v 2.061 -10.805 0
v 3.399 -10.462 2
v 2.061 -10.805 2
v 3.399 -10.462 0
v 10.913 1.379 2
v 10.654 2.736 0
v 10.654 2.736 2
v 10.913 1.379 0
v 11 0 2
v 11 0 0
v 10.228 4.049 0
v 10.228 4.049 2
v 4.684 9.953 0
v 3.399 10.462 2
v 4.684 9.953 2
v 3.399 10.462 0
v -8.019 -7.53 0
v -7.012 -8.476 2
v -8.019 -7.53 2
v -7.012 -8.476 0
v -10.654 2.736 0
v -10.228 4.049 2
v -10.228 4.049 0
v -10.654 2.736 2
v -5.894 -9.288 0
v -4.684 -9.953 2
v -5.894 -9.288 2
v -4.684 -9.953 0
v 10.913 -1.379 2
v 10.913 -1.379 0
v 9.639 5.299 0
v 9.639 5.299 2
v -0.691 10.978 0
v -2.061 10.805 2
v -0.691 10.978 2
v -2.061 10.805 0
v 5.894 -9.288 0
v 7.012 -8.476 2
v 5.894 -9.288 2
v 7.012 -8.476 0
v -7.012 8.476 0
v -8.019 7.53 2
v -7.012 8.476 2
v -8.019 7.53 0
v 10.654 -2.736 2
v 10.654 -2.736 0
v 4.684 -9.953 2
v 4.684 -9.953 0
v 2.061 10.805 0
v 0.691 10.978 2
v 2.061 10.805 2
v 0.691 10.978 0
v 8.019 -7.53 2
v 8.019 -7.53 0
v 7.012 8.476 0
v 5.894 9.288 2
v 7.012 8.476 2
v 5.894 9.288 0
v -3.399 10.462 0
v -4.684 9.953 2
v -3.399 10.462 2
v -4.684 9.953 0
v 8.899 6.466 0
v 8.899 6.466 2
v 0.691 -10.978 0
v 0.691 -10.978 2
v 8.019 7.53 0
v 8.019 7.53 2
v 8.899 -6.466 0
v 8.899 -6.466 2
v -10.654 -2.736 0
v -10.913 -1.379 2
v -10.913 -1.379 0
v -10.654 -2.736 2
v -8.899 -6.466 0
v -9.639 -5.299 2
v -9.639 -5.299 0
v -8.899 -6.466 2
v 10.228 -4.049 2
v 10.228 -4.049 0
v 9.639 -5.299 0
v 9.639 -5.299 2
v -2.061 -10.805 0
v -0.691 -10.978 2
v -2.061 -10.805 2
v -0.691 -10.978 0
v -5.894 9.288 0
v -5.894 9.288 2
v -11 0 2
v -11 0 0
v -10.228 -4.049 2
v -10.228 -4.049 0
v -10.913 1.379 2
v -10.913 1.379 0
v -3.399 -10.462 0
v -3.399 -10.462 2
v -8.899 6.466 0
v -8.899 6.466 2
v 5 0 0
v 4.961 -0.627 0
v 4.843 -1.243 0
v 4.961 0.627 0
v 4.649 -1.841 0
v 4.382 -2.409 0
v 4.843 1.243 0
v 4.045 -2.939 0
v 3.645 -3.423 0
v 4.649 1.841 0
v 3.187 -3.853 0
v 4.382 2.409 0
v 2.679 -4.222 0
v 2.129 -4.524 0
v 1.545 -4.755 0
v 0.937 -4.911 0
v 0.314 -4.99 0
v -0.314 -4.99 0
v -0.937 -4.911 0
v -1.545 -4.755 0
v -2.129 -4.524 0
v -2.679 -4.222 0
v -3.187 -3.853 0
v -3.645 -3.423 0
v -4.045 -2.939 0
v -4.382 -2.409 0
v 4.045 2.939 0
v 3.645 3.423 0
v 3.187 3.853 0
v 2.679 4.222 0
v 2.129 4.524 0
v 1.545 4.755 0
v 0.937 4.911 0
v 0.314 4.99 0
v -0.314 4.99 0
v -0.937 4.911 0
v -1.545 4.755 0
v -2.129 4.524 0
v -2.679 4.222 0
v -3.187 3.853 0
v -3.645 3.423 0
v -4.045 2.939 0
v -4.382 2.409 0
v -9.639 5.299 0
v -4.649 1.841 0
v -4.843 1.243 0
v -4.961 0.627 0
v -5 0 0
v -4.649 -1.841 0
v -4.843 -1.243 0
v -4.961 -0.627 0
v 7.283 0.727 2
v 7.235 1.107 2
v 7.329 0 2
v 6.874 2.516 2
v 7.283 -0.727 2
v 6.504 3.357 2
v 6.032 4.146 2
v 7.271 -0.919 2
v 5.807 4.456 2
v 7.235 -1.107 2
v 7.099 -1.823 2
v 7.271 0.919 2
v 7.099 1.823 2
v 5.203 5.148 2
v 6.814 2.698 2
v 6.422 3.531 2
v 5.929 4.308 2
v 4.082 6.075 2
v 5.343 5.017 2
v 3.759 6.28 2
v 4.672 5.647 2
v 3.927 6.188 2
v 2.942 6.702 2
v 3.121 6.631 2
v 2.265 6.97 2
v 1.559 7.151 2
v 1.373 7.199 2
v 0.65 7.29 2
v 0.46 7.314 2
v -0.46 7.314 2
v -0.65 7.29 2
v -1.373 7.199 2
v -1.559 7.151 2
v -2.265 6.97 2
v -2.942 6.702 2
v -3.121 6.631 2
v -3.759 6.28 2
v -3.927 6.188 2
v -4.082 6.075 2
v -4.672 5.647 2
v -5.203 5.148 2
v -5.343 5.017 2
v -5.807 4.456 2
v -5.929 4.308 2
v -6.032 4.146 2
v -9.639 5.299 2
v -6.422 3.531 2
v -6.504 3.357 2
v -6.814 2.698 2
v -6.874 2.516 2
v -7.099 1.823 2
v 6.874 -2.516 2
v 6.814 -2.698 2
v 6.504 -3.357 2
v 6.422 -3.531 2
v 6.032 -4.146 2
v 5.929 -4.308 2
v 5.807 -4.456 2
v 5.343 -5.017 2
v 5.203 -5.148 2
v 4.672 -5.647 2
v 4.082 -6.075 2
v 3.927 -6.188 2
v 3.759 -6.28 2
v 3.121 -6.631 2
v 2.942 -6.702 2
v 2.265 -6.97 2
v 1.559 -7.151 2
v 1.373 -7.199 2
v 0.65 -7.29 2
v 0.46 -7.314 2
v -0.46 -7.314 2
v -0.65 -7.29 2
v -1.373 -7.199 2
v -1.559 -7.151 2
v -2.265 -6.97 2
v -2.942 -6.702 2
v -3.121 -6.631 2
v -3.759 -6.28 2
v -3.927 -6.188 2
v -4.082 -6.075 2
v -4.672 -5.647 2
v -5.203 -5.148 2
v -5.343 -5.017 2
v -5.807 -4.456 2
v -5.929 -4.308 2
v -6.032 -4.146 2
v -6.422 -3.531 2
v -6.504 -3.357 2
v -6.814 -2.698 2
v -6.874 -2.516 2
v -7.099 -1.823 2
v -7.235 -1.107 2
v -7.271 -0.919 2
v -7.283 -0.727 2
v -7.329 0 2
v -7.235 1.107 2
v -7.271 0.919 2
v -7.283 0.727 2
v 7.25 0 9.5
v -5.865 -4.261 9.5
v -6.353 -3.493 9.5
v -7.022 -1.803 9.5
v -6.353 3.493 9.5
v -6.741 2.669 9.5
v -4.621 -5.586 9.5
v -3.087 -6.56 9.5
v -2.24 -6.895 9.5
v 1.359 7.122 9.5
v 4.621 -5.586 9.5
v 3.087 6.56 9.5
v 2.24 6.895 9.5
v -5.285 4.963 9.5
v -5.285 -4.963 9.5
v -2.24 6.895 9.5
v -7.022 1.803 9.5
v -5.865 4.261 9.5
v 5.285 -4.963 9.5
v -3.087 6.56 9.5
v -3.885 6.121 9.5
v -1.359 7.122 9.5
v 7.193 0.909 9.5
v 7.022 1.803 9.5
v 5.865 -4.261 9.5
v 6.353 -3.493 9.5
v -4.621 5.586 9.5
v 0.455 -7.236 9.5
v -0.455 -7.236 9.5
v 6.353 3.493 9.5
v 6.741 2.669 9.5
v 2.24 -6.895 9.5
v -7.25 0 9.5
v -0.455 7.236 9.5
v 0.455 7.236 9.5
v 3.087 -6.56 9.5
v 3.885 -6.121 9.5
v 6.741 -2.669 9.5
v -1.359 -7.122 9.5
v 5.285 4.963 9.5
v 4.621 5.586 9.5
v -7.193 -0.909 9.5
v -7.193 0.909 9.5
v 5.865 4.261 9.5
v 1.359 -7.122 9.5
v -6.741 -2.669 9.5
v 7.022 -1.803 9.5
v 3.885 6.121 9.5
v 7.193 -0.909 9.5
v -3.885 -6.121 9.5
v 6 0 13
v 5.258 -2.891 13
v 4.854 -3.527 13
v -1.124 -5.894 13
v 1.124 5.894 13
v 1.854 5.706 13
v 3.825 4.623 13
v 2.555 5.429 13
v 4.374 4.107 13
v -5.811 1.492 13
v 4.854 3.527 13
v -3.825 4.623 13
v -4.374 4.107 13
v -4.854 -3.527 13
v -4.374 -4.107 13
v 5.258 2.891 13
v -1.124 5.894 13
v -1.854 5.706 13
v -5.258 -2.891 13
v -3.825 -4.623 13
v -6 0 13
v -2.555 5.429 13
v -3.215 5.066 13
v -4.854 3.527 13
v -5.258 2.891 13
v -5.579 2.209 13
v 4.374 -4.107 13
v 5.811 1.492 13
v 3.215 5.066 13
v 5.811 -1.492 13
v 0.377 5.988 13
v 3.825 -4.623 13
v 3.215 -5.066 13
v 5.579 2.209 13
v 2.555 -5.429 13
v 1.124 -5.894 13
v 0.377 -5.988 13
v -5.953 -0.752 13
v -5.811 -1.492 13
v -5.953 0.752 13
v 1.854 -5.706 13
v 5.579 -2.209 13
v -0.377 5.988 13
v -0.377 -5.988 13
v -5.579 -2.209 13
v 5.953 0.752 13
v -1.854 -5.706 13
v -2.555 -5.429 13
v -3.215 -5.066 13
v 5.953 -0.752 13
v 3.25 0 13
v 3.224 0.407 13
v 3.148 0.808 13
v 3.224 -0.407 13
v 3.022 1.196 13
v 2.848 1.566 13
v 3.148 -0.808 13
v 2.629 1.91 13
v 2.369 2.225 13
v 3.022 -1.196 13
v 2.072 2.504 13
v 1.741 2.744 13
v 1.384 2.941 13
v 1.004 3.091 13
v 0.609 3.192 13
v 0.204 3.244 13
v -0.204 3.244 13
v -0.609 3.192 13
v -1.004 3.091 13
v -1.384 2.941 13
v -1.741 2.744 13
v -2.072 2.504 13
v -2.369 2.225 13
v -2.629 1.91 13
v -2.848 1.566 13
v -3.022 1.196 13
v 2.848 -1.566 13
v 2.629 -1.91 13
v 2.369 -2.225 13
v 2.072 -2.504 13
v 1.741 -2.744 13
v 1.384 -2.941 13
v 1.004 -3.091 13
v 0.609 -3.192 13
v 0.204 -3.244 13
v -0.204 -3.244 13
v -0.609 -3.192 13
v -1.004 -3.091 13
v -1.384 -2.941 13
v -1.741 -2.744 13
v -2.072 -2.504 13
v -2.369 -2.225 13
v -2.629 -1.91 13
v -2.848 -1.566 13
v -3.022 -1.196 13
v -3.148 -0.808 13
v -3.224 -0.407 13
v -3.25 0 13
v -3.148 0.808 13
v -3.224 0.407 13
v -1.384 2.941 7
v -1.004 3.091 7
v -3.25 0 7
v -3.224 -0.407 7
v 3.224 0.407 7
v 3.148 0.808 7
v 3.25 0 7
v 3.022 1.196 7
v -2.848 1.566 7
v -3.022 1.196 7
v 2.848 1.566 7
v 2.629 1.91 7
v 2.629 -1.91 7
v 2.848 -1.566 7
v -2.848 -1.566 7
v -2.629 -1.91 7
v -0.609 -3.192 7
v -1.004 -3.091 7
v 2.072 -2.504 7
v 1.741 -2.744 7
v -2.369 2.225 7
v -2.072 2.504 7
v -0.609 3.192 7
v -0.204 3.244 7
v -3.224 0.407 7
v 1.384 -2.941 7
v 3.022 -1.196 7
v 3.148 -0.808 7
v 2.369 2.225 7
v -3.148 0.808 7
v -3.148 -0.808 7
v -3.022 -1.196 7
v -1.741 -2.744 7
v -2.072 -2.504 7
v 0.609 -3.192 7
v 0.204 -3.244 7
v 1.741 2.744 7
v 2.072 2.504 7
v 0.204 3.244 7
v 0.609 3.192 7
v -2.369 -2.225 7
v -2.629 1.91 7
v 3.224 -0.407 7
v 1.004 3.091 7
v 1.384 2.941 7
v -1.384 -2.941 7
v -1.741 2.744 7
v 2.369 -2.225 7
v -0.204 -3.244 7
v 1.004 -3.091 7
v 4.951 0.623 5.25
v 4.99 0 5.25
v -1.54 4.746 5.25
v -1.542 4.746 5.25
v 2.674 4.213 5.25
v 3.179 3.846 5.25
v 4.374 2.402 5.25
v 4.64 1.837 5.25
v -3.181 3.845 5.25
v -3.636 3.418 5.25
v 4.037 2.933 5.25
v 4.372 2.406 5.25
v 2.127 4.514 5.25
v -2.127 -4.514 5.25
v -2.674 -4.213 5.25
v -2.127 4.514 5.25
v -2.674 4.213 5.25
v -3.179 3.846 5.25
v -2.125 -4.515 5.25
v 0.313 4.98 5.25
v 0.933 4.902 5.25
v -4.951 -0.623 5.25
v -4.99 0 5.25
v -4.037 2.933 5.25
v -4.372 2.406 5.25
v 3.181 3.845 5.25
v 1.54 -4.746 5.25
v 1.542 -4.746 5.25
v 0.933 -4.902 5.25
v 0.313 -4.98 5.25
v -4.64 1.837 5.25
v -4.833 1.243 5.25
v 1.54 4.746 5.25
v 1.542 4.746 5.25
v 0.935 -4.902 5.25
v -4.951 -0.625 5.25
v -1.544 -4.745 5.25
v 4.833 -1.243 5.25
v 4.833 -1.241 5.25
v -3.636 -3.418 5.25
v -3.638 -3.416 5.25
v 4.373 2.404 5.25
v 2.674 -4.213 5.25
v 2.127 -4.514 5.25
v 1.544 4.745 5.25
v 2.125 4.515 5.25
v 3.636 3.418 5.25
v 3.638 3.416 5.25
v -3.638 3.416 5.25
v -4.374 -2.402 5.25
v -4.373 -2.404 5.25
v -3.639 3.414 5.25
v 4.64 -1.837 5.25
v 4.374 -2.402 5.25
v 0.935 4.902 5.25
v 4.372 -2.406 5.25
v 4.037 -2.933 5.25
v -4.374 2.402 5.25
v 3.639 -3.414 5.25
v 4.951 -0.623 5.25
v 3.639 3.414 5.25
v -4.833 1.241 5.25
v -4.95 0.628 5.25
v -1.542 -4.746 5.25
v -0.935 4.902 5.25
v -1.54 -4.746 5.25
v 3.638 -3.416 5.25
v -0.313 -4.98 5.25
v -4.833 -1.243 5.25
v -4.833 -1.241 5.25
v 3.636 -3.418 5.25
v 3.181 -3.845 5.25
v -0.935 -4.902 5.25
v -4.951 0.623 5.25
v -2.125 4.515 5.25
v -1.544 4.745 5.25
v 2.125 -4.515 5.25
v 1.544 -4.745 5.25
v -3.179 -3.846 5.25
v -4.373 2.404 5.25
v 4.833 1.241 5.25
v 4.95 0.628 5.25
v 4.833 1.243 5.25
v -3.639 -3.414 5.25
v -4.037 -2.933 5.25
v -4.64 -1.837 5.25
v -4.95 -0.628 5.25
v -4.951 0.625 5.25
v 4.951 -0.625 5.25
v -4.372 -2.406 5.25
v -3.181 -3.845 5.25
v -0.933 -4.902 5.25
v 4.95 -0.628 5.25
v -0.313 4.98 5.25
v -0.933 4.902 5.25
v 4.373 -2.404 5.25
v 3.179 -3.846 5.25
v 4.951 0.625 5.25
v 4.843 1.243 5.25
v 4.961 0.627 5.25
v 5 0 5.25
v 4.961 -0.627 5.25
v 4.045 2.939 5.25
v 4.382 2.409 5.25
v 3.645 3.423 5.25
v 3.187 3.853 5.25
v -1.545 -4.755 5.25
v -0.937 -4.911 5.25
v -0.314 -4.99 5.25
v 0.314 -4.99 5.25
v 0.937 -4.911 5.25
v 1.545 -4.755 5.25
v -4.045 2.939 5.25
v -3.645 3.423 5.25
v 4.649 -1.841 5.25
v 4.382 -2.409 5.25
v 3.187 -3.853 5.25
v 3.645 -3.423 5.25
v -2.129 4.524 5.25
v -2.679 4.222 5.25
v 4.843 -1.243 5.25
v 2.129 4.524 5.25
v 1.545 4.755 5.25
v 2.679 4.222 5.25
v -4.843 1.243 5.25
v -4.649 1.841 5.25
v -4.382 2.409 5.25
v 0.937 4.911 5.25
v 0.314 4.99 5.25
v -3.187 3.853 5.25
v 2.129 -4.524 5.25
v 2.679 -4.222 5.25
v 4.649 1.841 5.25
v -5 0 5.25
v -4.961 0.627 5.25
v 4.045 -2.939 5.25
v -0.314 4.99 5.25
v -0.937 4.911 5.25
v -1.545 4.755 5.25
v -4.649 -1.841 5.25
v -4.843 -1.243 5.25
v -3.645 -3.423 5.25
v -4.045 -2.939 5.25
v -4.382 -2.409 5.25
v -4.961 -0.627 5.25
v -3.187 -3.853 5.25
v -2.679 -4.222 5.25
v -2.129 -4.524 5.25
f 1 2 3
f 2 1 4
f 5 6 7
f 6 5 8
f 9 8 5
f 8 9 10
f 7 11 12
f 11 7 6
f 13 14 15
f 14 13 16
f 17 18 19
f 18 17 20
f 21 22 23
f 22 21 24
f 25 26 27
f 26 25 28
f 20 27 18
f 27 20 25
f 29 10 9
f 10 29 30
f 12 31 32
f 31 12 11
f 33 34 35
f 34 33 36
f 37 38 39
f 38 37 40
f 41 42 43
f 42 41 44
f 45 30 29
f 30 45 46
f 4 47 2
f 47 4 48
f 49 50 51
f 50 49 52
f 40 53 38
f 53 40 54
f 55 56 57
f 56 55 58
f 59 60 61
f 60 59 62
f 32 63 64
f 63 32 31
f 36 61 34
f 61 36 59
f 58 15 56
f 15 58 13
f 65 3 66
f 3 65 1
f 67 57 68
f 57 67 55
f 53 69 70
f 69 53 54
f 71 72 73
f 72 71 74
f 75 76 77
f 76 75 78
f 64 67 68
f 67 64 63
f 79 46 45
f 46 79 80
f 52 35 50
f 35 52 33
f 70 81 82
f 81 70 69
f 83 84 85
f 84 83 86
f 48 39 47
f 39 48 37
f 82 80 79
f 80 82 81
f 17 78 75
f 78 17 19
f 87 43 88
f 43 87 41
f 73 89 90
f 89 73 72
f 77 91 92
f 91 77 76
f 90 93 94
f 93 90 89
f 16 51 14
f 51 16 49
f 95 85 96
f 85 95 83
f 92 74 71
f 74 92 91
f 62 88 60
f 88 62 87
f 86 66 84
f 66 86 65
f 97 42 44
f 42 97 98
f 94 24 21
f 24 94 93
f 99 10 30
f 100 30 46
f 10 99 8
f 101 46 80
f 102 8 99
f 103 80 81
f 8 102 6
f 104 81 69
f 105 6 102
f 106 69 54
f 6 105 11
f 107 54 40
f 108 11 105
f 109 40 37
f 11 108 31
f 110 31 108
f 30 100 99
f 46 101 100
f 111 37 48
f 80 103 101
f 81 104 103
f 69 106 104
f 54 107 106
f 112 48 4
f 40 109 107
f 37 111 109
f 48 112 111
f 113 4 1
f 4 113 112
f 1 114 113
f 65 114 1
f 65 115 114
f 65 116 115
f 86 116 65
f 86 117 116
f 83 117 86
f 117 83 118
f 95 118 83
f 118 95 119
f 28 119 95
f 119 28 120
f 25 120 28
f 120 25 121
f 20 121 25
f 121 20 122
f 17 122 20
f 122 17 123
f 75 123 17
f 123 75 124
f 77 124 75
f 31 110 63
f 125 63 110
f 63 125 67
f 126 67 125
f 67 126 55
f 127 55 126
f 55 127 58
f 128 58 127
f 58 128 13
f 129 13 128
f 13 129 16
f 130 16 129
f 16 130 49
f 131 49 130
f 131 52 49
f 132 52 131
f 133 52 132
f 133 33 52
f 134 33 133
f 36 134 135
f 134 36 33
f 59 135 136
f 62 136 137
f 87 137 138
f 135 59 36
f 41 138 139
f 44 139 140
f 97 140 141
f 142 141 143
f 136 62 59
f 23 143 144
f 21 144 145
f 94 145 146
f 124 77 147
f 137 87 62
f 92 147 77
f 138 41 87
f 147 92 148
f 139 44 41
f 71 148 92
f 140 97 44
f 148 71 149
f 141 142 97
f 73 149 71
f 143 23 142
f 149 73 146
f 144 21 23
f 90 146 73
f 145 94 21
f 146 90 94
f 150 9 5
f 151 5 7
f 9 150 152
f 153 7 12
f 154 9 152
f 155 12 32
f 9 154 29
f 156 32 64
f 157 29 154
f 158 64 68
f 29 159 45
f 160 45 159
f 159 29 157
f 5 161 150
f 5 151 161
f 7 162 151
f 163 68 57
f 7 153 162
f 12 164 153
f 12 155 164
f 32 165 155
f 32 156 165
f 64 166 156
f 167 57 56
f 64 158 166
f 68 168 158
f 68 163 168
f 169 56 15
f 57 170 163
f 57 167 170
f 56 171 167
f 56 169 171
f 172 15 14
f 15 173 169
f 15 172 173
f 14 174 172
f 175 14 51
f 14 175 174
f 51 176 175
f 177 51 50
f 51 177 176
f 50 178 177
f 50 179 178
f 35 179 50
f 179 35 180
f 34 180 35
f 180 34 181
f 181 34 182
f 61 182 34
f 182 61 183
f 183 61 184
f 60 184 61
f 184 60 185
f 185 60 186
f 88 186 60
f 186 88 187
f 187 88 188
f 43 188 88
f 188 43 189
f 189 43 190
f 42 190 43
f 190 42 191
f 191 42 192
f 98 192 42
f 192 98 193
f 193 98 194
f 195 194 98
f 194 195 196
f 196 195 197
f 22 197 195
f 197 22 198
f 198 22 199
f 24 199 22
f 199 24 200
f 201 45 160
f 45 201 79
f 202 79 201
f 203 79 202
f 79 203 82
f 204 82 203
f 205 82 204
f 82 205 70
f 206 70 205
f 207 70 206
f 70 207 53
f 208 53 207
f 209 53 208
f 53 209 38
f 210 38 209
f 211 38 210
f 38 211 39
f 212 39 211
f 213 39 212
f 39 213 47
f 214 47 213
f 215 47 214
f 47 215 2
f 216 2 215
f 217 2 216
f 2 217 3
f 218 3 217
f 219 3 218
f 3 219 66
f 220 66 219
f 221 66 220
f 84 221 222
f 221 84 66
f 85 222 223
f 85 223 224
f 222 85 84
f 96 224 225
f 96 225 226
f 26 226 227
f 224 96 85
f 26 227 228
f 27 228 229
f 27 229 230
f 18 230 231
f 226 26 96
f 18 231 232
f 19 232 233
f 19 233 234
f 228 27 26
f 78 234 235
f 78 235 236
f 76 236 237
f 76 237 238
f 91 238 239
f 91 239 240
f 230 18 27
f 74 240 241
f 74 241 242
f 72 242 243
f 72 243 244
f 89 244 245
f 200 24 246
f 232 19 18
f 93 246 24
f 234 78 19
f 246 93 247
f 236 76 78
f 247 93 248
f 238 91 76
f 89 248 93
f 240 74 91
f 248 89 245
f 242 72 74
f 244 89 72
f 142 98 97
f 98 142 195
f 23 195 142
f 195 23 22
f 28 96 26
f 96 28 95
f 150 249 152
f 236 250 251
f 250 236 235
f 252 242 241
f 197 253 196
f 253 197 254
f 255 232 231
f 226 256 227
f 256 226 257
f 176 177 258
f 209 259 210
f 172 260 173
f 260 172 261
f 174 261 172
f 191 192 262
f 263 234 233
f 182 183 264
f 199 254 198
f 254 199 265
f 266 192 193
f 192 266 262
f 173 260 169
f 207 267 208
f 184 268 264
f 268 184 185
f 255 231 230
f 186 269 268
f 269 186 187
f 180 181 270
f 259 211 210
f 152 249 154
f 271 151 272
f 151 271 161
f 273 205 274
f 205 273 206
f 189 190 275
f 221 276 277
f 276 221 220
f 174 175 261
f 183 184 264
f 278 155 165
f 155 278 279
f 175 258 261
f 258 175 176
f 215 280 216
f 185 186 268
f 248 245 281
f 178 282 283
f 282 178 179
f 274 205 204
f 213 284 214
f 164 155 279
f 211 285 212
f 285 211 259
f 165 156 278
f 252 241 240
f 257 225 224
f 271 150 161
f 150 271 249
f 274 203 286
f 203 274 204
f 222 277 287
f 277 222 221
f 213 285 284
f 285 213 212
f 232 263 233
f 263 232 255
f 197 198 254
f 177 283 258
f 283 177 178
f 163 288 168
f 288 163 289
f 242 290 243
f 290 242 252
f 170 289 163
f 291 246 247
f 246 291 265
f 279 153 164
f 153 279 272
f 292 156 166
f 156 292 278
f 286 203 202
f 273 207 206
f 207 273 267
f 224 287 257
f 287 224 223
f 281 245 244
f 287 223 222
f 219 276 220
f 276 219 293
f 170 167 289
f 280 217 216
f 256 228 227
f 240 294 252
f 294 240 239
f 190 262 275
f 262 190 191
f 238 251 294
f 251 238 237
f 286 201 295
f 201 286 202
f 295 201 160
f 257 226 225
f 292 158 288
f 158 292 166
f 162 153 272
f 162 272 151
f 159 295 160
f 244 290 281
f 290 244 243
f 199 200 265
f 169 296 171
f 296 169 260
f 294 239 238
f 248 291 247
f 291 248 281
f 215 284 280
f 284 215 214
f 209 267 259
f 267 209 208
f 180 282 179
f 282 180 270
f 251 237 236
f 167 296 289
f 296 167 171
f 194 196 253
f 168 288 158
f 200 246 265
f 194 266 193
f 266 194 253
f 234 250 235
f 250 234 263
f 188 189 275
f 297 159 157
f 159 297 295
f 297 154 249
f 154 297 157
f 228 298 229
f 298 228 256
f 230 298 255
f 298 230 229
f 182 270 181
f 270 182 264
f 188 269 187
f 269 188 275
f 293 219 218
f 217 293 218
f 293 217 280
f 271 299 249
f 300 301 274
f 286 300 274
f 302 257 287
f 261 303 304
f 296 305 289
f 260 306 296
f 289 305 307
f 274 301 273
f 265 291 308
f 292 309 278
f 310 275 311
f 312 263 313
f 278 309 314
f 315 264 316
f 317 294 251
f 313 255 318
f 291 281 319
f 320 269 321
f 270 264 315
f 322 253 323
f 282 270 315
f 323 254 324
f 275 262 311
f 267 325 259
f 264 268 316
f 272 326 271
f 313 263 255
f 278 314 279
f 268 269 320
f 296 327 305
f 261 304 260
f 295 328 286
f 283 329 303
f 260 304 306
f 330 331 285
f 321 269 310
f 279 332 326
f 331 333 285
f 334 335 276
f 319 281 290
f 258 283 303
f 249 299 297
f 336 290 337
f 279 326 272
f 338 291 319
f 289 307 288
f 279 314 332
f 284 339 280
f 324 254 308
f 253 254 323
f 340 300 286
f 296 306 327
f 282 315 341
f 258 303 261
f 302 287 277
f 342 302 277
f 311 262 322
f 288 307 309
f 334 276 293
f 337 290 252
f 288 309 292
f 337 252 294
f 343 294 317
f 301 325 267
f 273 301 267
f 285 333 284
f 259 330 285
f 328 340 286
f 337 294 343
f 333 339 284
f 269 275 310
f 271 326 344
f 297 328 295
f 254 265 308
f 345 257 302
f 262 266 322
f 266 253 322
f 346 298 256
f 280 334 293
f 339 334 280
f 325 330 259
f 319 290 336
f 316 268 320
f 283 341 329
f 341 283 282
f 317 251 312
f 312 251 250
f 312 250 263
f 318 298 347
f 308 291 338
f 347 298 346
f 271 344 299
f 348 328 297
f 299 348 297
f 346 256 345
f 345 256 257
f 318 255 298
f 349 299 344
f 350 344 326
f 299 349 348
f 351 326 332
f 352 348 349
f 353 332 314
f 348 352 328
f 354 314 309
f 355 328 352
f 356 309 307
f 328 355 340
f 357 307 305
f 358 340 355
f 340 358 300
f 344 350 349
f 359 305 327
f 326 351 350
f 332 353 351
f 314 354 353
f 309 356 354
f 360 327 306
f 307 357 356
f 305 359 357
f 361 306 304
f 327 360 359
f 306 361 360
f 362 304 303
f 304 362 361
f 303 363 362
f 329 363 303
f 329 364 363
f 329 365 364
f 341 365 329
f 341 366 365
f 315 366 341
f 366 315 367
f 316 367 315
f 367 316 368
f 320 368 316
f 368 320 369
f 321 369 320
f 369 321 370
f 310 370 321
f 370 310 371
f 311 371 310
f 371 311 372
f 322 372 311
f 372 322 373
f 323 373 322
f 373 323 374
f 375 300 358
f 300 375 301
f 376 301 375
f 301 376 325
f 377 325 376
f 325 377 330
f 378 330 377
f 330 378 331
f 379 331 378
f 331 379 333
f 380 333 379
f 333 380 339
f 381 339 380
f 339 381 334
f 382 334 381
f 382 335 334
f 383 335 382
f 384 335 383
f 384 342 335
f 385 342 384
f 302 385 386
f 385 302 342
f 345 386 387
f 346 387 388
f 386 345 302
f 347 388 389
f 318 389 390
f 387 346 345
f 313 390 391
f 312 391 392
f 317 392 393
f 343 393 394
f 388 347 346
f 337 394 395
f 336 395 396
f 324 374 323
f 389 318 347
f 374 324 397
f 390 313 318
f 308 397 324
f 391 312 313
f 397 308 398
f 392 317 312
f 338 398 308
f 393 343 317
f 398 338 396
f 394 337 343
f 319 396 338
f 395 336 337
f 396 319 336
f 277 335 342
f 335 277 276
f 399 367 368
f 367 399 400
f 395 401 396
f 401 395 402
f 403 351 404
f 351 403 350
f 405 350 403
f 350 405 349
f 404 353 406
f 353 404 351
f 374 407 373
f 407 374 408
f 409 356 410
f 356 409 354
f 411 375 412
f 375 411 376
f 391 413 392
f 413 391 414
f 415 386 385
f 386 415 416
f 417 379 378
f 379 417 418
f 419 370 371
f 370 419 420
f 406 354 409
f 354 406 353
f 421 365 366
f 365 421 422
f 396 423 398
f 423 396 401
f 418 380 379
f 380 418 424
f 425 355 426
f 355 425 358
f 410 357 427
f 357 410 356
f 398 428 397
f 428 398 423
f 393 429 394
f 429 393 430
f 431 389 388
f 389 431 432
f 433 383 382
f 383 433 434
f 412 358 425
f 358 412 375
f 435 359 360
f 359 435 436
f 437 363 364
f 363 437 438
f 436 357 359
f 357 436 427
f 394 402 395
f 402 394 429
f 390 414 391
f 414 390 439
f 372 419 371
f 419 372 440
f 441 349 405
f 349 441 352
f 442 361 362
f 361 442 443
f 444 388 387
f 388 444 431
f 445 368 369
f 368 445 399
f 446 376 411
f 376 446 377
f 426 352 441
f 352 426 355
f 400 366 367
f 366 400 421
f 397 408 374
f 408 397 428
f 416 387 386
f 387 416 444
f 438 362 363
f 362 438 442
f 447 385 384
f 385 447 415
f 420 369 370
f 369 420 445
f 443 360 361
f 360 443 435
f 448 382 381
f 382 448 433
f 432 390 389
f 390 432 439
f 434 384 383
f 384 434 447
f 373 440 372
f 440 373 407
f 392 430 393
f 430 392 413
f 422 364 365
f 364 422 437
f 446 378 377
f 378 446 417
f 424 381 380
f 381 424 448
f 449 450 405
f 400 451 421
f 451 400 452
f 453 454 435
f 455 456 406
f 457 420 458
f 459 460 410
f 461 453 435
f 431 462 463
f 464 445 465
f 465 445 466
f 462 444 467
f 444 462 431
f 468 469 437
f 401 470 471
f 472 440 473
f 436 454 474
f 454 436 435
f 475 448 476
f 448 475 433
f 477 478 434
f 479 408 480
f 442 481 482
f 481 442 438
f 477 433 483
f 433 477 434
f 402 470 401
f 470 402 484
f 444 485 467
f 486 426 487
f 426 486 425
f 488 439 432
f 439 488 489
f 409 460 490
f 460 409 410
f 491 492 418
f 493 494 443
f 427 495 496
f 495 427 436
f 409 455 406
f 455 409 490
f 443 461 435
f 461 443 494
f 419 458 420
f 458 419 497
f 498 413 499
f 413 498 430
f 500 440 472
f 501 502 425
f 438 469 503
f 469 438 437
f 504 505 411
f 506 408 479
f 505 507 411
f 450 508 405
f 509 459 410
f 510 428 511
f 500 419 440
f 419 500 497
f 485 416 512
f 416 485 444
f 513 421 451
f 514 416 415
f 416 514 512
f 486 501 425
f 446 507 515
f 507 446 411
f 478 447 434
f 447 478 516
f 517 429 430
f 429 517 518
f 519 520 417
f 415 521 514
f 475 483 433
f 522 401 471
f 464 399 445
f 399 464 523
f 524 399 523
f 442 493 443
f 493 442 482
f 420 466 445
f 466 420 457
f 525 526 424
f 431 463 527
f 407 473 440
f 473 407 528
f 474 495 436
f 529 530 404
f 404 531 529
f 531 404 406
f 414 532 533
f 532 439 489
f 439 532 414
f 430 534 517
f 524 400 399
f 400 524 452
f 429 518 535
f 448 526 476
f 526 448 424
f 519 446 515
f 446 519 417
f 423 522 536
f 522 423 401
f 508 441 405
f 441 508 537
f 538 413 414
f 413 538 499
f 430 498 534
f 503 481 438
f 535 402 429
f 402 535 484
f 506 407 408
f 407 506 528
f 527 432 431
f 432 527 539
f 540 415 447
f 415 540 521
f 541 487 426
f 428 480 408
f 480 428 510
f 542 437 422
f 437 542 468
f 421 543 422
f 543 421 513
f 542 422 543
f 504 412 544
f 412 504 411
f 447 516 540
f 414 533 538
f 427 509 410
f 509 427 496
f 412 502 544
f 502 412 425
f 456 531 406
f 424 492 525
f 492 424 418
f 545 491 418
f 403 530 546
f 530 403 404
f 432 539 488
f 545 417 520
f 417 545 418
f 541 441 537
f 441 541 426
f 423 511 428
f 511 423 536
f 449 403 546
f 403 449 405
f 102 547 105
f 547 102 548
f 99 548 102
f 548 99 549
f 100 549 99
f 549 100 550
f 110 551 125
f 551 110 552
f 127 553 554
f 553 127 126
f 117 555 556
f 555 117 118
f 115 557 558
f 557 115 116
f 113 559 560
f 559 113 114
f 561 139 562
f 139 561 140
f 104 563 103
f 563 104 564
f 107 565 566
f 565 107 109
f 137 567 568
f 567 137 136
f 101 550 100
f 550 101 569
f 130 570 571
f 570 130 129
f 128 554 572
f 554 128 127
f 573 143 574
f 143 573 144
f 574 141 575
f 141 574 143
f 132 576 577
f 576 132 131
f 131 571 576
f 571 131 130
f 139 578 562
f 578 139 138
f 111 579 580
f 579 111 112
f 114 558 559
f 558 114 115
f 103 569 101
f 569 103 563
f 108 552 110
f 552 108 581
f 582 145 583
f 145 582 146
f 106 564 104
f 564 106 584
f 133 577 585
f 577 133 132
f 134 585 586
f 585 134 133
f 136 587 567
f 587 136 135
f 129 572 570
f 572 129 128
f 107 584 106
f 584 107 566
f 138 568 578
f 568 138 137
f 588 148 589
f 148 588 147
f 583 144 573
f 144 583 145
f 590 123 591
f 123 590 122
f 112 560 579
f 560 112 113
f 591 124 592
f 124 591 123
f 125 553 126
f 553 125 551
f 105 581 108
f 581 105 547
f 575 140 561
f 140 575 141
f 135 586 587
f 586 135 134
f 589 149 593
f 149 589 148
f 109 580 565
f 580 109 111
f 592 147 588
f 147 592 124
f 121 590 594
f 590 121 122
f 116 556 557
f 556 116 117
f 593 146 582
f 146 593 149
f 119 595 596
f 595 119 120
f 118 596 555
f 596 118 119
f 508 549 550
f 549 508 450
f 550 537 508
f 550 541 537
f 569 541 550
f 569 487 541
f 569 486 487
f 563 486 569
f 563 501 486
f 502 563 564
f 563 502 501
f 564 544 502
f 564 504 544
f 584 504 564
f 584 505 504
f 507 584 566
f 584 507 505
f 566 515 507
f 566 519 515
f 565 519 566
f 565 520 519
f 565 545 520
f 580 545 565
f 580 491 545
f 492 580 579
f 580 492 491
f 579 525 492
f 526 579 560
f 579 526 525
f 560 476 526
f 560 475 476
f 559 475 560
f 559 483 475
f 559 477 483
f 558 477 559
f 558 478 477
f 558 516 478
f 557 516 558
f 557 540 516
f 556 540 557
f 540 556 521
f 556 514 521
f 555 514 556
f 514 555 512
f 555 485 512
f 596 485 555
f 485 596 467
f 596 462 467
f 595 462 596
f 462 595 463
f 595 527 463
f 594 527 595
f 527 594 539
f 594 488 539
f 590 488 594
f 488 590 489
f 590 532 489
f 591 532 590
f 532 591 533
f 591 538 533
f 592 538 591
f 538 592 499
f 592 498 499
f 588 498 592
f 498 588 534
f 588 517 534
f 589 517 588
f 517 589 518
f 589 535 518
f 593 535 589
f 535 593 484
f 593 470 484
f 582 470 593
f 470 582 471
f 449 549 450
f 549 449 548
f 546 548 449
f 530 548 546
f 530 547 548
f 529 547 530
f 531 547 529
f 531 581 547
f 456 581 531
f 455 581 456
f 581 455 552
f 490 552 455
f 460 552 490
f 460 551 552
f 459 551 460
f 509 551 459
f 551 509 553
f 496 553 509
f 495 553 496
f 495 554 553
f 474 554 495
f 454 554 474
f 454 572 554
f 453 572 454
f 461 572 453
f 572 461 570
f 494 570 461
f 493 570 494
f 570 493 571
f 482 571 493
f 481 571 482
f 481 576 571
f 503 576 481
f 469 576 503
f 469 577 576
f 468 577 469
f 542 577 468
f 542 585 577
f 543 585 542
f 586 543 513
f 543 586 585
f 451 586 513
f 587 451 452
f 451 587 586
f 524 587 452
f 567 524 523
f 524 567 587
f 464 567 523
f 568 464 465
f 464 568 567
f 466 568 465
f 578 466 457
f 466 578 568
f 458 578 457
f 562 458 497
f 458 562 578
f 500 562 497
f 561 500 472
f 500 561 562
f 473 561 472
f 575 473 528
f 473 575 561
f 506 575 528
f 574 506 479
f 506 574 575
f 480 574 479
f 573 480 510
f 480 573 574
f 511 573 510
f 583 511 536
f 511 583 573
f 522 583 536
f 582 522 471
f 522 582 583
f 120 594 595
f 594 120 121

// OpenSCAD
$fn=50;

difference(){
    union(){
        cylinder(r=11,h=2);
        cylinder(r1=7.35,h=9.5,r2=7.25);
        translate([0,0,9.5]) cylinder(r1=7.25,r2=6,h=3.5);
    }
    translate([0,0,-0.5]) cylinder(r=3.25,h=20);
    translate([0,0,5.24]) cylinder(r1=5,r2=3.25,h=1.76);
    translate([0,0,-0.5]) cylinder(r=5,h=5.75);
}
